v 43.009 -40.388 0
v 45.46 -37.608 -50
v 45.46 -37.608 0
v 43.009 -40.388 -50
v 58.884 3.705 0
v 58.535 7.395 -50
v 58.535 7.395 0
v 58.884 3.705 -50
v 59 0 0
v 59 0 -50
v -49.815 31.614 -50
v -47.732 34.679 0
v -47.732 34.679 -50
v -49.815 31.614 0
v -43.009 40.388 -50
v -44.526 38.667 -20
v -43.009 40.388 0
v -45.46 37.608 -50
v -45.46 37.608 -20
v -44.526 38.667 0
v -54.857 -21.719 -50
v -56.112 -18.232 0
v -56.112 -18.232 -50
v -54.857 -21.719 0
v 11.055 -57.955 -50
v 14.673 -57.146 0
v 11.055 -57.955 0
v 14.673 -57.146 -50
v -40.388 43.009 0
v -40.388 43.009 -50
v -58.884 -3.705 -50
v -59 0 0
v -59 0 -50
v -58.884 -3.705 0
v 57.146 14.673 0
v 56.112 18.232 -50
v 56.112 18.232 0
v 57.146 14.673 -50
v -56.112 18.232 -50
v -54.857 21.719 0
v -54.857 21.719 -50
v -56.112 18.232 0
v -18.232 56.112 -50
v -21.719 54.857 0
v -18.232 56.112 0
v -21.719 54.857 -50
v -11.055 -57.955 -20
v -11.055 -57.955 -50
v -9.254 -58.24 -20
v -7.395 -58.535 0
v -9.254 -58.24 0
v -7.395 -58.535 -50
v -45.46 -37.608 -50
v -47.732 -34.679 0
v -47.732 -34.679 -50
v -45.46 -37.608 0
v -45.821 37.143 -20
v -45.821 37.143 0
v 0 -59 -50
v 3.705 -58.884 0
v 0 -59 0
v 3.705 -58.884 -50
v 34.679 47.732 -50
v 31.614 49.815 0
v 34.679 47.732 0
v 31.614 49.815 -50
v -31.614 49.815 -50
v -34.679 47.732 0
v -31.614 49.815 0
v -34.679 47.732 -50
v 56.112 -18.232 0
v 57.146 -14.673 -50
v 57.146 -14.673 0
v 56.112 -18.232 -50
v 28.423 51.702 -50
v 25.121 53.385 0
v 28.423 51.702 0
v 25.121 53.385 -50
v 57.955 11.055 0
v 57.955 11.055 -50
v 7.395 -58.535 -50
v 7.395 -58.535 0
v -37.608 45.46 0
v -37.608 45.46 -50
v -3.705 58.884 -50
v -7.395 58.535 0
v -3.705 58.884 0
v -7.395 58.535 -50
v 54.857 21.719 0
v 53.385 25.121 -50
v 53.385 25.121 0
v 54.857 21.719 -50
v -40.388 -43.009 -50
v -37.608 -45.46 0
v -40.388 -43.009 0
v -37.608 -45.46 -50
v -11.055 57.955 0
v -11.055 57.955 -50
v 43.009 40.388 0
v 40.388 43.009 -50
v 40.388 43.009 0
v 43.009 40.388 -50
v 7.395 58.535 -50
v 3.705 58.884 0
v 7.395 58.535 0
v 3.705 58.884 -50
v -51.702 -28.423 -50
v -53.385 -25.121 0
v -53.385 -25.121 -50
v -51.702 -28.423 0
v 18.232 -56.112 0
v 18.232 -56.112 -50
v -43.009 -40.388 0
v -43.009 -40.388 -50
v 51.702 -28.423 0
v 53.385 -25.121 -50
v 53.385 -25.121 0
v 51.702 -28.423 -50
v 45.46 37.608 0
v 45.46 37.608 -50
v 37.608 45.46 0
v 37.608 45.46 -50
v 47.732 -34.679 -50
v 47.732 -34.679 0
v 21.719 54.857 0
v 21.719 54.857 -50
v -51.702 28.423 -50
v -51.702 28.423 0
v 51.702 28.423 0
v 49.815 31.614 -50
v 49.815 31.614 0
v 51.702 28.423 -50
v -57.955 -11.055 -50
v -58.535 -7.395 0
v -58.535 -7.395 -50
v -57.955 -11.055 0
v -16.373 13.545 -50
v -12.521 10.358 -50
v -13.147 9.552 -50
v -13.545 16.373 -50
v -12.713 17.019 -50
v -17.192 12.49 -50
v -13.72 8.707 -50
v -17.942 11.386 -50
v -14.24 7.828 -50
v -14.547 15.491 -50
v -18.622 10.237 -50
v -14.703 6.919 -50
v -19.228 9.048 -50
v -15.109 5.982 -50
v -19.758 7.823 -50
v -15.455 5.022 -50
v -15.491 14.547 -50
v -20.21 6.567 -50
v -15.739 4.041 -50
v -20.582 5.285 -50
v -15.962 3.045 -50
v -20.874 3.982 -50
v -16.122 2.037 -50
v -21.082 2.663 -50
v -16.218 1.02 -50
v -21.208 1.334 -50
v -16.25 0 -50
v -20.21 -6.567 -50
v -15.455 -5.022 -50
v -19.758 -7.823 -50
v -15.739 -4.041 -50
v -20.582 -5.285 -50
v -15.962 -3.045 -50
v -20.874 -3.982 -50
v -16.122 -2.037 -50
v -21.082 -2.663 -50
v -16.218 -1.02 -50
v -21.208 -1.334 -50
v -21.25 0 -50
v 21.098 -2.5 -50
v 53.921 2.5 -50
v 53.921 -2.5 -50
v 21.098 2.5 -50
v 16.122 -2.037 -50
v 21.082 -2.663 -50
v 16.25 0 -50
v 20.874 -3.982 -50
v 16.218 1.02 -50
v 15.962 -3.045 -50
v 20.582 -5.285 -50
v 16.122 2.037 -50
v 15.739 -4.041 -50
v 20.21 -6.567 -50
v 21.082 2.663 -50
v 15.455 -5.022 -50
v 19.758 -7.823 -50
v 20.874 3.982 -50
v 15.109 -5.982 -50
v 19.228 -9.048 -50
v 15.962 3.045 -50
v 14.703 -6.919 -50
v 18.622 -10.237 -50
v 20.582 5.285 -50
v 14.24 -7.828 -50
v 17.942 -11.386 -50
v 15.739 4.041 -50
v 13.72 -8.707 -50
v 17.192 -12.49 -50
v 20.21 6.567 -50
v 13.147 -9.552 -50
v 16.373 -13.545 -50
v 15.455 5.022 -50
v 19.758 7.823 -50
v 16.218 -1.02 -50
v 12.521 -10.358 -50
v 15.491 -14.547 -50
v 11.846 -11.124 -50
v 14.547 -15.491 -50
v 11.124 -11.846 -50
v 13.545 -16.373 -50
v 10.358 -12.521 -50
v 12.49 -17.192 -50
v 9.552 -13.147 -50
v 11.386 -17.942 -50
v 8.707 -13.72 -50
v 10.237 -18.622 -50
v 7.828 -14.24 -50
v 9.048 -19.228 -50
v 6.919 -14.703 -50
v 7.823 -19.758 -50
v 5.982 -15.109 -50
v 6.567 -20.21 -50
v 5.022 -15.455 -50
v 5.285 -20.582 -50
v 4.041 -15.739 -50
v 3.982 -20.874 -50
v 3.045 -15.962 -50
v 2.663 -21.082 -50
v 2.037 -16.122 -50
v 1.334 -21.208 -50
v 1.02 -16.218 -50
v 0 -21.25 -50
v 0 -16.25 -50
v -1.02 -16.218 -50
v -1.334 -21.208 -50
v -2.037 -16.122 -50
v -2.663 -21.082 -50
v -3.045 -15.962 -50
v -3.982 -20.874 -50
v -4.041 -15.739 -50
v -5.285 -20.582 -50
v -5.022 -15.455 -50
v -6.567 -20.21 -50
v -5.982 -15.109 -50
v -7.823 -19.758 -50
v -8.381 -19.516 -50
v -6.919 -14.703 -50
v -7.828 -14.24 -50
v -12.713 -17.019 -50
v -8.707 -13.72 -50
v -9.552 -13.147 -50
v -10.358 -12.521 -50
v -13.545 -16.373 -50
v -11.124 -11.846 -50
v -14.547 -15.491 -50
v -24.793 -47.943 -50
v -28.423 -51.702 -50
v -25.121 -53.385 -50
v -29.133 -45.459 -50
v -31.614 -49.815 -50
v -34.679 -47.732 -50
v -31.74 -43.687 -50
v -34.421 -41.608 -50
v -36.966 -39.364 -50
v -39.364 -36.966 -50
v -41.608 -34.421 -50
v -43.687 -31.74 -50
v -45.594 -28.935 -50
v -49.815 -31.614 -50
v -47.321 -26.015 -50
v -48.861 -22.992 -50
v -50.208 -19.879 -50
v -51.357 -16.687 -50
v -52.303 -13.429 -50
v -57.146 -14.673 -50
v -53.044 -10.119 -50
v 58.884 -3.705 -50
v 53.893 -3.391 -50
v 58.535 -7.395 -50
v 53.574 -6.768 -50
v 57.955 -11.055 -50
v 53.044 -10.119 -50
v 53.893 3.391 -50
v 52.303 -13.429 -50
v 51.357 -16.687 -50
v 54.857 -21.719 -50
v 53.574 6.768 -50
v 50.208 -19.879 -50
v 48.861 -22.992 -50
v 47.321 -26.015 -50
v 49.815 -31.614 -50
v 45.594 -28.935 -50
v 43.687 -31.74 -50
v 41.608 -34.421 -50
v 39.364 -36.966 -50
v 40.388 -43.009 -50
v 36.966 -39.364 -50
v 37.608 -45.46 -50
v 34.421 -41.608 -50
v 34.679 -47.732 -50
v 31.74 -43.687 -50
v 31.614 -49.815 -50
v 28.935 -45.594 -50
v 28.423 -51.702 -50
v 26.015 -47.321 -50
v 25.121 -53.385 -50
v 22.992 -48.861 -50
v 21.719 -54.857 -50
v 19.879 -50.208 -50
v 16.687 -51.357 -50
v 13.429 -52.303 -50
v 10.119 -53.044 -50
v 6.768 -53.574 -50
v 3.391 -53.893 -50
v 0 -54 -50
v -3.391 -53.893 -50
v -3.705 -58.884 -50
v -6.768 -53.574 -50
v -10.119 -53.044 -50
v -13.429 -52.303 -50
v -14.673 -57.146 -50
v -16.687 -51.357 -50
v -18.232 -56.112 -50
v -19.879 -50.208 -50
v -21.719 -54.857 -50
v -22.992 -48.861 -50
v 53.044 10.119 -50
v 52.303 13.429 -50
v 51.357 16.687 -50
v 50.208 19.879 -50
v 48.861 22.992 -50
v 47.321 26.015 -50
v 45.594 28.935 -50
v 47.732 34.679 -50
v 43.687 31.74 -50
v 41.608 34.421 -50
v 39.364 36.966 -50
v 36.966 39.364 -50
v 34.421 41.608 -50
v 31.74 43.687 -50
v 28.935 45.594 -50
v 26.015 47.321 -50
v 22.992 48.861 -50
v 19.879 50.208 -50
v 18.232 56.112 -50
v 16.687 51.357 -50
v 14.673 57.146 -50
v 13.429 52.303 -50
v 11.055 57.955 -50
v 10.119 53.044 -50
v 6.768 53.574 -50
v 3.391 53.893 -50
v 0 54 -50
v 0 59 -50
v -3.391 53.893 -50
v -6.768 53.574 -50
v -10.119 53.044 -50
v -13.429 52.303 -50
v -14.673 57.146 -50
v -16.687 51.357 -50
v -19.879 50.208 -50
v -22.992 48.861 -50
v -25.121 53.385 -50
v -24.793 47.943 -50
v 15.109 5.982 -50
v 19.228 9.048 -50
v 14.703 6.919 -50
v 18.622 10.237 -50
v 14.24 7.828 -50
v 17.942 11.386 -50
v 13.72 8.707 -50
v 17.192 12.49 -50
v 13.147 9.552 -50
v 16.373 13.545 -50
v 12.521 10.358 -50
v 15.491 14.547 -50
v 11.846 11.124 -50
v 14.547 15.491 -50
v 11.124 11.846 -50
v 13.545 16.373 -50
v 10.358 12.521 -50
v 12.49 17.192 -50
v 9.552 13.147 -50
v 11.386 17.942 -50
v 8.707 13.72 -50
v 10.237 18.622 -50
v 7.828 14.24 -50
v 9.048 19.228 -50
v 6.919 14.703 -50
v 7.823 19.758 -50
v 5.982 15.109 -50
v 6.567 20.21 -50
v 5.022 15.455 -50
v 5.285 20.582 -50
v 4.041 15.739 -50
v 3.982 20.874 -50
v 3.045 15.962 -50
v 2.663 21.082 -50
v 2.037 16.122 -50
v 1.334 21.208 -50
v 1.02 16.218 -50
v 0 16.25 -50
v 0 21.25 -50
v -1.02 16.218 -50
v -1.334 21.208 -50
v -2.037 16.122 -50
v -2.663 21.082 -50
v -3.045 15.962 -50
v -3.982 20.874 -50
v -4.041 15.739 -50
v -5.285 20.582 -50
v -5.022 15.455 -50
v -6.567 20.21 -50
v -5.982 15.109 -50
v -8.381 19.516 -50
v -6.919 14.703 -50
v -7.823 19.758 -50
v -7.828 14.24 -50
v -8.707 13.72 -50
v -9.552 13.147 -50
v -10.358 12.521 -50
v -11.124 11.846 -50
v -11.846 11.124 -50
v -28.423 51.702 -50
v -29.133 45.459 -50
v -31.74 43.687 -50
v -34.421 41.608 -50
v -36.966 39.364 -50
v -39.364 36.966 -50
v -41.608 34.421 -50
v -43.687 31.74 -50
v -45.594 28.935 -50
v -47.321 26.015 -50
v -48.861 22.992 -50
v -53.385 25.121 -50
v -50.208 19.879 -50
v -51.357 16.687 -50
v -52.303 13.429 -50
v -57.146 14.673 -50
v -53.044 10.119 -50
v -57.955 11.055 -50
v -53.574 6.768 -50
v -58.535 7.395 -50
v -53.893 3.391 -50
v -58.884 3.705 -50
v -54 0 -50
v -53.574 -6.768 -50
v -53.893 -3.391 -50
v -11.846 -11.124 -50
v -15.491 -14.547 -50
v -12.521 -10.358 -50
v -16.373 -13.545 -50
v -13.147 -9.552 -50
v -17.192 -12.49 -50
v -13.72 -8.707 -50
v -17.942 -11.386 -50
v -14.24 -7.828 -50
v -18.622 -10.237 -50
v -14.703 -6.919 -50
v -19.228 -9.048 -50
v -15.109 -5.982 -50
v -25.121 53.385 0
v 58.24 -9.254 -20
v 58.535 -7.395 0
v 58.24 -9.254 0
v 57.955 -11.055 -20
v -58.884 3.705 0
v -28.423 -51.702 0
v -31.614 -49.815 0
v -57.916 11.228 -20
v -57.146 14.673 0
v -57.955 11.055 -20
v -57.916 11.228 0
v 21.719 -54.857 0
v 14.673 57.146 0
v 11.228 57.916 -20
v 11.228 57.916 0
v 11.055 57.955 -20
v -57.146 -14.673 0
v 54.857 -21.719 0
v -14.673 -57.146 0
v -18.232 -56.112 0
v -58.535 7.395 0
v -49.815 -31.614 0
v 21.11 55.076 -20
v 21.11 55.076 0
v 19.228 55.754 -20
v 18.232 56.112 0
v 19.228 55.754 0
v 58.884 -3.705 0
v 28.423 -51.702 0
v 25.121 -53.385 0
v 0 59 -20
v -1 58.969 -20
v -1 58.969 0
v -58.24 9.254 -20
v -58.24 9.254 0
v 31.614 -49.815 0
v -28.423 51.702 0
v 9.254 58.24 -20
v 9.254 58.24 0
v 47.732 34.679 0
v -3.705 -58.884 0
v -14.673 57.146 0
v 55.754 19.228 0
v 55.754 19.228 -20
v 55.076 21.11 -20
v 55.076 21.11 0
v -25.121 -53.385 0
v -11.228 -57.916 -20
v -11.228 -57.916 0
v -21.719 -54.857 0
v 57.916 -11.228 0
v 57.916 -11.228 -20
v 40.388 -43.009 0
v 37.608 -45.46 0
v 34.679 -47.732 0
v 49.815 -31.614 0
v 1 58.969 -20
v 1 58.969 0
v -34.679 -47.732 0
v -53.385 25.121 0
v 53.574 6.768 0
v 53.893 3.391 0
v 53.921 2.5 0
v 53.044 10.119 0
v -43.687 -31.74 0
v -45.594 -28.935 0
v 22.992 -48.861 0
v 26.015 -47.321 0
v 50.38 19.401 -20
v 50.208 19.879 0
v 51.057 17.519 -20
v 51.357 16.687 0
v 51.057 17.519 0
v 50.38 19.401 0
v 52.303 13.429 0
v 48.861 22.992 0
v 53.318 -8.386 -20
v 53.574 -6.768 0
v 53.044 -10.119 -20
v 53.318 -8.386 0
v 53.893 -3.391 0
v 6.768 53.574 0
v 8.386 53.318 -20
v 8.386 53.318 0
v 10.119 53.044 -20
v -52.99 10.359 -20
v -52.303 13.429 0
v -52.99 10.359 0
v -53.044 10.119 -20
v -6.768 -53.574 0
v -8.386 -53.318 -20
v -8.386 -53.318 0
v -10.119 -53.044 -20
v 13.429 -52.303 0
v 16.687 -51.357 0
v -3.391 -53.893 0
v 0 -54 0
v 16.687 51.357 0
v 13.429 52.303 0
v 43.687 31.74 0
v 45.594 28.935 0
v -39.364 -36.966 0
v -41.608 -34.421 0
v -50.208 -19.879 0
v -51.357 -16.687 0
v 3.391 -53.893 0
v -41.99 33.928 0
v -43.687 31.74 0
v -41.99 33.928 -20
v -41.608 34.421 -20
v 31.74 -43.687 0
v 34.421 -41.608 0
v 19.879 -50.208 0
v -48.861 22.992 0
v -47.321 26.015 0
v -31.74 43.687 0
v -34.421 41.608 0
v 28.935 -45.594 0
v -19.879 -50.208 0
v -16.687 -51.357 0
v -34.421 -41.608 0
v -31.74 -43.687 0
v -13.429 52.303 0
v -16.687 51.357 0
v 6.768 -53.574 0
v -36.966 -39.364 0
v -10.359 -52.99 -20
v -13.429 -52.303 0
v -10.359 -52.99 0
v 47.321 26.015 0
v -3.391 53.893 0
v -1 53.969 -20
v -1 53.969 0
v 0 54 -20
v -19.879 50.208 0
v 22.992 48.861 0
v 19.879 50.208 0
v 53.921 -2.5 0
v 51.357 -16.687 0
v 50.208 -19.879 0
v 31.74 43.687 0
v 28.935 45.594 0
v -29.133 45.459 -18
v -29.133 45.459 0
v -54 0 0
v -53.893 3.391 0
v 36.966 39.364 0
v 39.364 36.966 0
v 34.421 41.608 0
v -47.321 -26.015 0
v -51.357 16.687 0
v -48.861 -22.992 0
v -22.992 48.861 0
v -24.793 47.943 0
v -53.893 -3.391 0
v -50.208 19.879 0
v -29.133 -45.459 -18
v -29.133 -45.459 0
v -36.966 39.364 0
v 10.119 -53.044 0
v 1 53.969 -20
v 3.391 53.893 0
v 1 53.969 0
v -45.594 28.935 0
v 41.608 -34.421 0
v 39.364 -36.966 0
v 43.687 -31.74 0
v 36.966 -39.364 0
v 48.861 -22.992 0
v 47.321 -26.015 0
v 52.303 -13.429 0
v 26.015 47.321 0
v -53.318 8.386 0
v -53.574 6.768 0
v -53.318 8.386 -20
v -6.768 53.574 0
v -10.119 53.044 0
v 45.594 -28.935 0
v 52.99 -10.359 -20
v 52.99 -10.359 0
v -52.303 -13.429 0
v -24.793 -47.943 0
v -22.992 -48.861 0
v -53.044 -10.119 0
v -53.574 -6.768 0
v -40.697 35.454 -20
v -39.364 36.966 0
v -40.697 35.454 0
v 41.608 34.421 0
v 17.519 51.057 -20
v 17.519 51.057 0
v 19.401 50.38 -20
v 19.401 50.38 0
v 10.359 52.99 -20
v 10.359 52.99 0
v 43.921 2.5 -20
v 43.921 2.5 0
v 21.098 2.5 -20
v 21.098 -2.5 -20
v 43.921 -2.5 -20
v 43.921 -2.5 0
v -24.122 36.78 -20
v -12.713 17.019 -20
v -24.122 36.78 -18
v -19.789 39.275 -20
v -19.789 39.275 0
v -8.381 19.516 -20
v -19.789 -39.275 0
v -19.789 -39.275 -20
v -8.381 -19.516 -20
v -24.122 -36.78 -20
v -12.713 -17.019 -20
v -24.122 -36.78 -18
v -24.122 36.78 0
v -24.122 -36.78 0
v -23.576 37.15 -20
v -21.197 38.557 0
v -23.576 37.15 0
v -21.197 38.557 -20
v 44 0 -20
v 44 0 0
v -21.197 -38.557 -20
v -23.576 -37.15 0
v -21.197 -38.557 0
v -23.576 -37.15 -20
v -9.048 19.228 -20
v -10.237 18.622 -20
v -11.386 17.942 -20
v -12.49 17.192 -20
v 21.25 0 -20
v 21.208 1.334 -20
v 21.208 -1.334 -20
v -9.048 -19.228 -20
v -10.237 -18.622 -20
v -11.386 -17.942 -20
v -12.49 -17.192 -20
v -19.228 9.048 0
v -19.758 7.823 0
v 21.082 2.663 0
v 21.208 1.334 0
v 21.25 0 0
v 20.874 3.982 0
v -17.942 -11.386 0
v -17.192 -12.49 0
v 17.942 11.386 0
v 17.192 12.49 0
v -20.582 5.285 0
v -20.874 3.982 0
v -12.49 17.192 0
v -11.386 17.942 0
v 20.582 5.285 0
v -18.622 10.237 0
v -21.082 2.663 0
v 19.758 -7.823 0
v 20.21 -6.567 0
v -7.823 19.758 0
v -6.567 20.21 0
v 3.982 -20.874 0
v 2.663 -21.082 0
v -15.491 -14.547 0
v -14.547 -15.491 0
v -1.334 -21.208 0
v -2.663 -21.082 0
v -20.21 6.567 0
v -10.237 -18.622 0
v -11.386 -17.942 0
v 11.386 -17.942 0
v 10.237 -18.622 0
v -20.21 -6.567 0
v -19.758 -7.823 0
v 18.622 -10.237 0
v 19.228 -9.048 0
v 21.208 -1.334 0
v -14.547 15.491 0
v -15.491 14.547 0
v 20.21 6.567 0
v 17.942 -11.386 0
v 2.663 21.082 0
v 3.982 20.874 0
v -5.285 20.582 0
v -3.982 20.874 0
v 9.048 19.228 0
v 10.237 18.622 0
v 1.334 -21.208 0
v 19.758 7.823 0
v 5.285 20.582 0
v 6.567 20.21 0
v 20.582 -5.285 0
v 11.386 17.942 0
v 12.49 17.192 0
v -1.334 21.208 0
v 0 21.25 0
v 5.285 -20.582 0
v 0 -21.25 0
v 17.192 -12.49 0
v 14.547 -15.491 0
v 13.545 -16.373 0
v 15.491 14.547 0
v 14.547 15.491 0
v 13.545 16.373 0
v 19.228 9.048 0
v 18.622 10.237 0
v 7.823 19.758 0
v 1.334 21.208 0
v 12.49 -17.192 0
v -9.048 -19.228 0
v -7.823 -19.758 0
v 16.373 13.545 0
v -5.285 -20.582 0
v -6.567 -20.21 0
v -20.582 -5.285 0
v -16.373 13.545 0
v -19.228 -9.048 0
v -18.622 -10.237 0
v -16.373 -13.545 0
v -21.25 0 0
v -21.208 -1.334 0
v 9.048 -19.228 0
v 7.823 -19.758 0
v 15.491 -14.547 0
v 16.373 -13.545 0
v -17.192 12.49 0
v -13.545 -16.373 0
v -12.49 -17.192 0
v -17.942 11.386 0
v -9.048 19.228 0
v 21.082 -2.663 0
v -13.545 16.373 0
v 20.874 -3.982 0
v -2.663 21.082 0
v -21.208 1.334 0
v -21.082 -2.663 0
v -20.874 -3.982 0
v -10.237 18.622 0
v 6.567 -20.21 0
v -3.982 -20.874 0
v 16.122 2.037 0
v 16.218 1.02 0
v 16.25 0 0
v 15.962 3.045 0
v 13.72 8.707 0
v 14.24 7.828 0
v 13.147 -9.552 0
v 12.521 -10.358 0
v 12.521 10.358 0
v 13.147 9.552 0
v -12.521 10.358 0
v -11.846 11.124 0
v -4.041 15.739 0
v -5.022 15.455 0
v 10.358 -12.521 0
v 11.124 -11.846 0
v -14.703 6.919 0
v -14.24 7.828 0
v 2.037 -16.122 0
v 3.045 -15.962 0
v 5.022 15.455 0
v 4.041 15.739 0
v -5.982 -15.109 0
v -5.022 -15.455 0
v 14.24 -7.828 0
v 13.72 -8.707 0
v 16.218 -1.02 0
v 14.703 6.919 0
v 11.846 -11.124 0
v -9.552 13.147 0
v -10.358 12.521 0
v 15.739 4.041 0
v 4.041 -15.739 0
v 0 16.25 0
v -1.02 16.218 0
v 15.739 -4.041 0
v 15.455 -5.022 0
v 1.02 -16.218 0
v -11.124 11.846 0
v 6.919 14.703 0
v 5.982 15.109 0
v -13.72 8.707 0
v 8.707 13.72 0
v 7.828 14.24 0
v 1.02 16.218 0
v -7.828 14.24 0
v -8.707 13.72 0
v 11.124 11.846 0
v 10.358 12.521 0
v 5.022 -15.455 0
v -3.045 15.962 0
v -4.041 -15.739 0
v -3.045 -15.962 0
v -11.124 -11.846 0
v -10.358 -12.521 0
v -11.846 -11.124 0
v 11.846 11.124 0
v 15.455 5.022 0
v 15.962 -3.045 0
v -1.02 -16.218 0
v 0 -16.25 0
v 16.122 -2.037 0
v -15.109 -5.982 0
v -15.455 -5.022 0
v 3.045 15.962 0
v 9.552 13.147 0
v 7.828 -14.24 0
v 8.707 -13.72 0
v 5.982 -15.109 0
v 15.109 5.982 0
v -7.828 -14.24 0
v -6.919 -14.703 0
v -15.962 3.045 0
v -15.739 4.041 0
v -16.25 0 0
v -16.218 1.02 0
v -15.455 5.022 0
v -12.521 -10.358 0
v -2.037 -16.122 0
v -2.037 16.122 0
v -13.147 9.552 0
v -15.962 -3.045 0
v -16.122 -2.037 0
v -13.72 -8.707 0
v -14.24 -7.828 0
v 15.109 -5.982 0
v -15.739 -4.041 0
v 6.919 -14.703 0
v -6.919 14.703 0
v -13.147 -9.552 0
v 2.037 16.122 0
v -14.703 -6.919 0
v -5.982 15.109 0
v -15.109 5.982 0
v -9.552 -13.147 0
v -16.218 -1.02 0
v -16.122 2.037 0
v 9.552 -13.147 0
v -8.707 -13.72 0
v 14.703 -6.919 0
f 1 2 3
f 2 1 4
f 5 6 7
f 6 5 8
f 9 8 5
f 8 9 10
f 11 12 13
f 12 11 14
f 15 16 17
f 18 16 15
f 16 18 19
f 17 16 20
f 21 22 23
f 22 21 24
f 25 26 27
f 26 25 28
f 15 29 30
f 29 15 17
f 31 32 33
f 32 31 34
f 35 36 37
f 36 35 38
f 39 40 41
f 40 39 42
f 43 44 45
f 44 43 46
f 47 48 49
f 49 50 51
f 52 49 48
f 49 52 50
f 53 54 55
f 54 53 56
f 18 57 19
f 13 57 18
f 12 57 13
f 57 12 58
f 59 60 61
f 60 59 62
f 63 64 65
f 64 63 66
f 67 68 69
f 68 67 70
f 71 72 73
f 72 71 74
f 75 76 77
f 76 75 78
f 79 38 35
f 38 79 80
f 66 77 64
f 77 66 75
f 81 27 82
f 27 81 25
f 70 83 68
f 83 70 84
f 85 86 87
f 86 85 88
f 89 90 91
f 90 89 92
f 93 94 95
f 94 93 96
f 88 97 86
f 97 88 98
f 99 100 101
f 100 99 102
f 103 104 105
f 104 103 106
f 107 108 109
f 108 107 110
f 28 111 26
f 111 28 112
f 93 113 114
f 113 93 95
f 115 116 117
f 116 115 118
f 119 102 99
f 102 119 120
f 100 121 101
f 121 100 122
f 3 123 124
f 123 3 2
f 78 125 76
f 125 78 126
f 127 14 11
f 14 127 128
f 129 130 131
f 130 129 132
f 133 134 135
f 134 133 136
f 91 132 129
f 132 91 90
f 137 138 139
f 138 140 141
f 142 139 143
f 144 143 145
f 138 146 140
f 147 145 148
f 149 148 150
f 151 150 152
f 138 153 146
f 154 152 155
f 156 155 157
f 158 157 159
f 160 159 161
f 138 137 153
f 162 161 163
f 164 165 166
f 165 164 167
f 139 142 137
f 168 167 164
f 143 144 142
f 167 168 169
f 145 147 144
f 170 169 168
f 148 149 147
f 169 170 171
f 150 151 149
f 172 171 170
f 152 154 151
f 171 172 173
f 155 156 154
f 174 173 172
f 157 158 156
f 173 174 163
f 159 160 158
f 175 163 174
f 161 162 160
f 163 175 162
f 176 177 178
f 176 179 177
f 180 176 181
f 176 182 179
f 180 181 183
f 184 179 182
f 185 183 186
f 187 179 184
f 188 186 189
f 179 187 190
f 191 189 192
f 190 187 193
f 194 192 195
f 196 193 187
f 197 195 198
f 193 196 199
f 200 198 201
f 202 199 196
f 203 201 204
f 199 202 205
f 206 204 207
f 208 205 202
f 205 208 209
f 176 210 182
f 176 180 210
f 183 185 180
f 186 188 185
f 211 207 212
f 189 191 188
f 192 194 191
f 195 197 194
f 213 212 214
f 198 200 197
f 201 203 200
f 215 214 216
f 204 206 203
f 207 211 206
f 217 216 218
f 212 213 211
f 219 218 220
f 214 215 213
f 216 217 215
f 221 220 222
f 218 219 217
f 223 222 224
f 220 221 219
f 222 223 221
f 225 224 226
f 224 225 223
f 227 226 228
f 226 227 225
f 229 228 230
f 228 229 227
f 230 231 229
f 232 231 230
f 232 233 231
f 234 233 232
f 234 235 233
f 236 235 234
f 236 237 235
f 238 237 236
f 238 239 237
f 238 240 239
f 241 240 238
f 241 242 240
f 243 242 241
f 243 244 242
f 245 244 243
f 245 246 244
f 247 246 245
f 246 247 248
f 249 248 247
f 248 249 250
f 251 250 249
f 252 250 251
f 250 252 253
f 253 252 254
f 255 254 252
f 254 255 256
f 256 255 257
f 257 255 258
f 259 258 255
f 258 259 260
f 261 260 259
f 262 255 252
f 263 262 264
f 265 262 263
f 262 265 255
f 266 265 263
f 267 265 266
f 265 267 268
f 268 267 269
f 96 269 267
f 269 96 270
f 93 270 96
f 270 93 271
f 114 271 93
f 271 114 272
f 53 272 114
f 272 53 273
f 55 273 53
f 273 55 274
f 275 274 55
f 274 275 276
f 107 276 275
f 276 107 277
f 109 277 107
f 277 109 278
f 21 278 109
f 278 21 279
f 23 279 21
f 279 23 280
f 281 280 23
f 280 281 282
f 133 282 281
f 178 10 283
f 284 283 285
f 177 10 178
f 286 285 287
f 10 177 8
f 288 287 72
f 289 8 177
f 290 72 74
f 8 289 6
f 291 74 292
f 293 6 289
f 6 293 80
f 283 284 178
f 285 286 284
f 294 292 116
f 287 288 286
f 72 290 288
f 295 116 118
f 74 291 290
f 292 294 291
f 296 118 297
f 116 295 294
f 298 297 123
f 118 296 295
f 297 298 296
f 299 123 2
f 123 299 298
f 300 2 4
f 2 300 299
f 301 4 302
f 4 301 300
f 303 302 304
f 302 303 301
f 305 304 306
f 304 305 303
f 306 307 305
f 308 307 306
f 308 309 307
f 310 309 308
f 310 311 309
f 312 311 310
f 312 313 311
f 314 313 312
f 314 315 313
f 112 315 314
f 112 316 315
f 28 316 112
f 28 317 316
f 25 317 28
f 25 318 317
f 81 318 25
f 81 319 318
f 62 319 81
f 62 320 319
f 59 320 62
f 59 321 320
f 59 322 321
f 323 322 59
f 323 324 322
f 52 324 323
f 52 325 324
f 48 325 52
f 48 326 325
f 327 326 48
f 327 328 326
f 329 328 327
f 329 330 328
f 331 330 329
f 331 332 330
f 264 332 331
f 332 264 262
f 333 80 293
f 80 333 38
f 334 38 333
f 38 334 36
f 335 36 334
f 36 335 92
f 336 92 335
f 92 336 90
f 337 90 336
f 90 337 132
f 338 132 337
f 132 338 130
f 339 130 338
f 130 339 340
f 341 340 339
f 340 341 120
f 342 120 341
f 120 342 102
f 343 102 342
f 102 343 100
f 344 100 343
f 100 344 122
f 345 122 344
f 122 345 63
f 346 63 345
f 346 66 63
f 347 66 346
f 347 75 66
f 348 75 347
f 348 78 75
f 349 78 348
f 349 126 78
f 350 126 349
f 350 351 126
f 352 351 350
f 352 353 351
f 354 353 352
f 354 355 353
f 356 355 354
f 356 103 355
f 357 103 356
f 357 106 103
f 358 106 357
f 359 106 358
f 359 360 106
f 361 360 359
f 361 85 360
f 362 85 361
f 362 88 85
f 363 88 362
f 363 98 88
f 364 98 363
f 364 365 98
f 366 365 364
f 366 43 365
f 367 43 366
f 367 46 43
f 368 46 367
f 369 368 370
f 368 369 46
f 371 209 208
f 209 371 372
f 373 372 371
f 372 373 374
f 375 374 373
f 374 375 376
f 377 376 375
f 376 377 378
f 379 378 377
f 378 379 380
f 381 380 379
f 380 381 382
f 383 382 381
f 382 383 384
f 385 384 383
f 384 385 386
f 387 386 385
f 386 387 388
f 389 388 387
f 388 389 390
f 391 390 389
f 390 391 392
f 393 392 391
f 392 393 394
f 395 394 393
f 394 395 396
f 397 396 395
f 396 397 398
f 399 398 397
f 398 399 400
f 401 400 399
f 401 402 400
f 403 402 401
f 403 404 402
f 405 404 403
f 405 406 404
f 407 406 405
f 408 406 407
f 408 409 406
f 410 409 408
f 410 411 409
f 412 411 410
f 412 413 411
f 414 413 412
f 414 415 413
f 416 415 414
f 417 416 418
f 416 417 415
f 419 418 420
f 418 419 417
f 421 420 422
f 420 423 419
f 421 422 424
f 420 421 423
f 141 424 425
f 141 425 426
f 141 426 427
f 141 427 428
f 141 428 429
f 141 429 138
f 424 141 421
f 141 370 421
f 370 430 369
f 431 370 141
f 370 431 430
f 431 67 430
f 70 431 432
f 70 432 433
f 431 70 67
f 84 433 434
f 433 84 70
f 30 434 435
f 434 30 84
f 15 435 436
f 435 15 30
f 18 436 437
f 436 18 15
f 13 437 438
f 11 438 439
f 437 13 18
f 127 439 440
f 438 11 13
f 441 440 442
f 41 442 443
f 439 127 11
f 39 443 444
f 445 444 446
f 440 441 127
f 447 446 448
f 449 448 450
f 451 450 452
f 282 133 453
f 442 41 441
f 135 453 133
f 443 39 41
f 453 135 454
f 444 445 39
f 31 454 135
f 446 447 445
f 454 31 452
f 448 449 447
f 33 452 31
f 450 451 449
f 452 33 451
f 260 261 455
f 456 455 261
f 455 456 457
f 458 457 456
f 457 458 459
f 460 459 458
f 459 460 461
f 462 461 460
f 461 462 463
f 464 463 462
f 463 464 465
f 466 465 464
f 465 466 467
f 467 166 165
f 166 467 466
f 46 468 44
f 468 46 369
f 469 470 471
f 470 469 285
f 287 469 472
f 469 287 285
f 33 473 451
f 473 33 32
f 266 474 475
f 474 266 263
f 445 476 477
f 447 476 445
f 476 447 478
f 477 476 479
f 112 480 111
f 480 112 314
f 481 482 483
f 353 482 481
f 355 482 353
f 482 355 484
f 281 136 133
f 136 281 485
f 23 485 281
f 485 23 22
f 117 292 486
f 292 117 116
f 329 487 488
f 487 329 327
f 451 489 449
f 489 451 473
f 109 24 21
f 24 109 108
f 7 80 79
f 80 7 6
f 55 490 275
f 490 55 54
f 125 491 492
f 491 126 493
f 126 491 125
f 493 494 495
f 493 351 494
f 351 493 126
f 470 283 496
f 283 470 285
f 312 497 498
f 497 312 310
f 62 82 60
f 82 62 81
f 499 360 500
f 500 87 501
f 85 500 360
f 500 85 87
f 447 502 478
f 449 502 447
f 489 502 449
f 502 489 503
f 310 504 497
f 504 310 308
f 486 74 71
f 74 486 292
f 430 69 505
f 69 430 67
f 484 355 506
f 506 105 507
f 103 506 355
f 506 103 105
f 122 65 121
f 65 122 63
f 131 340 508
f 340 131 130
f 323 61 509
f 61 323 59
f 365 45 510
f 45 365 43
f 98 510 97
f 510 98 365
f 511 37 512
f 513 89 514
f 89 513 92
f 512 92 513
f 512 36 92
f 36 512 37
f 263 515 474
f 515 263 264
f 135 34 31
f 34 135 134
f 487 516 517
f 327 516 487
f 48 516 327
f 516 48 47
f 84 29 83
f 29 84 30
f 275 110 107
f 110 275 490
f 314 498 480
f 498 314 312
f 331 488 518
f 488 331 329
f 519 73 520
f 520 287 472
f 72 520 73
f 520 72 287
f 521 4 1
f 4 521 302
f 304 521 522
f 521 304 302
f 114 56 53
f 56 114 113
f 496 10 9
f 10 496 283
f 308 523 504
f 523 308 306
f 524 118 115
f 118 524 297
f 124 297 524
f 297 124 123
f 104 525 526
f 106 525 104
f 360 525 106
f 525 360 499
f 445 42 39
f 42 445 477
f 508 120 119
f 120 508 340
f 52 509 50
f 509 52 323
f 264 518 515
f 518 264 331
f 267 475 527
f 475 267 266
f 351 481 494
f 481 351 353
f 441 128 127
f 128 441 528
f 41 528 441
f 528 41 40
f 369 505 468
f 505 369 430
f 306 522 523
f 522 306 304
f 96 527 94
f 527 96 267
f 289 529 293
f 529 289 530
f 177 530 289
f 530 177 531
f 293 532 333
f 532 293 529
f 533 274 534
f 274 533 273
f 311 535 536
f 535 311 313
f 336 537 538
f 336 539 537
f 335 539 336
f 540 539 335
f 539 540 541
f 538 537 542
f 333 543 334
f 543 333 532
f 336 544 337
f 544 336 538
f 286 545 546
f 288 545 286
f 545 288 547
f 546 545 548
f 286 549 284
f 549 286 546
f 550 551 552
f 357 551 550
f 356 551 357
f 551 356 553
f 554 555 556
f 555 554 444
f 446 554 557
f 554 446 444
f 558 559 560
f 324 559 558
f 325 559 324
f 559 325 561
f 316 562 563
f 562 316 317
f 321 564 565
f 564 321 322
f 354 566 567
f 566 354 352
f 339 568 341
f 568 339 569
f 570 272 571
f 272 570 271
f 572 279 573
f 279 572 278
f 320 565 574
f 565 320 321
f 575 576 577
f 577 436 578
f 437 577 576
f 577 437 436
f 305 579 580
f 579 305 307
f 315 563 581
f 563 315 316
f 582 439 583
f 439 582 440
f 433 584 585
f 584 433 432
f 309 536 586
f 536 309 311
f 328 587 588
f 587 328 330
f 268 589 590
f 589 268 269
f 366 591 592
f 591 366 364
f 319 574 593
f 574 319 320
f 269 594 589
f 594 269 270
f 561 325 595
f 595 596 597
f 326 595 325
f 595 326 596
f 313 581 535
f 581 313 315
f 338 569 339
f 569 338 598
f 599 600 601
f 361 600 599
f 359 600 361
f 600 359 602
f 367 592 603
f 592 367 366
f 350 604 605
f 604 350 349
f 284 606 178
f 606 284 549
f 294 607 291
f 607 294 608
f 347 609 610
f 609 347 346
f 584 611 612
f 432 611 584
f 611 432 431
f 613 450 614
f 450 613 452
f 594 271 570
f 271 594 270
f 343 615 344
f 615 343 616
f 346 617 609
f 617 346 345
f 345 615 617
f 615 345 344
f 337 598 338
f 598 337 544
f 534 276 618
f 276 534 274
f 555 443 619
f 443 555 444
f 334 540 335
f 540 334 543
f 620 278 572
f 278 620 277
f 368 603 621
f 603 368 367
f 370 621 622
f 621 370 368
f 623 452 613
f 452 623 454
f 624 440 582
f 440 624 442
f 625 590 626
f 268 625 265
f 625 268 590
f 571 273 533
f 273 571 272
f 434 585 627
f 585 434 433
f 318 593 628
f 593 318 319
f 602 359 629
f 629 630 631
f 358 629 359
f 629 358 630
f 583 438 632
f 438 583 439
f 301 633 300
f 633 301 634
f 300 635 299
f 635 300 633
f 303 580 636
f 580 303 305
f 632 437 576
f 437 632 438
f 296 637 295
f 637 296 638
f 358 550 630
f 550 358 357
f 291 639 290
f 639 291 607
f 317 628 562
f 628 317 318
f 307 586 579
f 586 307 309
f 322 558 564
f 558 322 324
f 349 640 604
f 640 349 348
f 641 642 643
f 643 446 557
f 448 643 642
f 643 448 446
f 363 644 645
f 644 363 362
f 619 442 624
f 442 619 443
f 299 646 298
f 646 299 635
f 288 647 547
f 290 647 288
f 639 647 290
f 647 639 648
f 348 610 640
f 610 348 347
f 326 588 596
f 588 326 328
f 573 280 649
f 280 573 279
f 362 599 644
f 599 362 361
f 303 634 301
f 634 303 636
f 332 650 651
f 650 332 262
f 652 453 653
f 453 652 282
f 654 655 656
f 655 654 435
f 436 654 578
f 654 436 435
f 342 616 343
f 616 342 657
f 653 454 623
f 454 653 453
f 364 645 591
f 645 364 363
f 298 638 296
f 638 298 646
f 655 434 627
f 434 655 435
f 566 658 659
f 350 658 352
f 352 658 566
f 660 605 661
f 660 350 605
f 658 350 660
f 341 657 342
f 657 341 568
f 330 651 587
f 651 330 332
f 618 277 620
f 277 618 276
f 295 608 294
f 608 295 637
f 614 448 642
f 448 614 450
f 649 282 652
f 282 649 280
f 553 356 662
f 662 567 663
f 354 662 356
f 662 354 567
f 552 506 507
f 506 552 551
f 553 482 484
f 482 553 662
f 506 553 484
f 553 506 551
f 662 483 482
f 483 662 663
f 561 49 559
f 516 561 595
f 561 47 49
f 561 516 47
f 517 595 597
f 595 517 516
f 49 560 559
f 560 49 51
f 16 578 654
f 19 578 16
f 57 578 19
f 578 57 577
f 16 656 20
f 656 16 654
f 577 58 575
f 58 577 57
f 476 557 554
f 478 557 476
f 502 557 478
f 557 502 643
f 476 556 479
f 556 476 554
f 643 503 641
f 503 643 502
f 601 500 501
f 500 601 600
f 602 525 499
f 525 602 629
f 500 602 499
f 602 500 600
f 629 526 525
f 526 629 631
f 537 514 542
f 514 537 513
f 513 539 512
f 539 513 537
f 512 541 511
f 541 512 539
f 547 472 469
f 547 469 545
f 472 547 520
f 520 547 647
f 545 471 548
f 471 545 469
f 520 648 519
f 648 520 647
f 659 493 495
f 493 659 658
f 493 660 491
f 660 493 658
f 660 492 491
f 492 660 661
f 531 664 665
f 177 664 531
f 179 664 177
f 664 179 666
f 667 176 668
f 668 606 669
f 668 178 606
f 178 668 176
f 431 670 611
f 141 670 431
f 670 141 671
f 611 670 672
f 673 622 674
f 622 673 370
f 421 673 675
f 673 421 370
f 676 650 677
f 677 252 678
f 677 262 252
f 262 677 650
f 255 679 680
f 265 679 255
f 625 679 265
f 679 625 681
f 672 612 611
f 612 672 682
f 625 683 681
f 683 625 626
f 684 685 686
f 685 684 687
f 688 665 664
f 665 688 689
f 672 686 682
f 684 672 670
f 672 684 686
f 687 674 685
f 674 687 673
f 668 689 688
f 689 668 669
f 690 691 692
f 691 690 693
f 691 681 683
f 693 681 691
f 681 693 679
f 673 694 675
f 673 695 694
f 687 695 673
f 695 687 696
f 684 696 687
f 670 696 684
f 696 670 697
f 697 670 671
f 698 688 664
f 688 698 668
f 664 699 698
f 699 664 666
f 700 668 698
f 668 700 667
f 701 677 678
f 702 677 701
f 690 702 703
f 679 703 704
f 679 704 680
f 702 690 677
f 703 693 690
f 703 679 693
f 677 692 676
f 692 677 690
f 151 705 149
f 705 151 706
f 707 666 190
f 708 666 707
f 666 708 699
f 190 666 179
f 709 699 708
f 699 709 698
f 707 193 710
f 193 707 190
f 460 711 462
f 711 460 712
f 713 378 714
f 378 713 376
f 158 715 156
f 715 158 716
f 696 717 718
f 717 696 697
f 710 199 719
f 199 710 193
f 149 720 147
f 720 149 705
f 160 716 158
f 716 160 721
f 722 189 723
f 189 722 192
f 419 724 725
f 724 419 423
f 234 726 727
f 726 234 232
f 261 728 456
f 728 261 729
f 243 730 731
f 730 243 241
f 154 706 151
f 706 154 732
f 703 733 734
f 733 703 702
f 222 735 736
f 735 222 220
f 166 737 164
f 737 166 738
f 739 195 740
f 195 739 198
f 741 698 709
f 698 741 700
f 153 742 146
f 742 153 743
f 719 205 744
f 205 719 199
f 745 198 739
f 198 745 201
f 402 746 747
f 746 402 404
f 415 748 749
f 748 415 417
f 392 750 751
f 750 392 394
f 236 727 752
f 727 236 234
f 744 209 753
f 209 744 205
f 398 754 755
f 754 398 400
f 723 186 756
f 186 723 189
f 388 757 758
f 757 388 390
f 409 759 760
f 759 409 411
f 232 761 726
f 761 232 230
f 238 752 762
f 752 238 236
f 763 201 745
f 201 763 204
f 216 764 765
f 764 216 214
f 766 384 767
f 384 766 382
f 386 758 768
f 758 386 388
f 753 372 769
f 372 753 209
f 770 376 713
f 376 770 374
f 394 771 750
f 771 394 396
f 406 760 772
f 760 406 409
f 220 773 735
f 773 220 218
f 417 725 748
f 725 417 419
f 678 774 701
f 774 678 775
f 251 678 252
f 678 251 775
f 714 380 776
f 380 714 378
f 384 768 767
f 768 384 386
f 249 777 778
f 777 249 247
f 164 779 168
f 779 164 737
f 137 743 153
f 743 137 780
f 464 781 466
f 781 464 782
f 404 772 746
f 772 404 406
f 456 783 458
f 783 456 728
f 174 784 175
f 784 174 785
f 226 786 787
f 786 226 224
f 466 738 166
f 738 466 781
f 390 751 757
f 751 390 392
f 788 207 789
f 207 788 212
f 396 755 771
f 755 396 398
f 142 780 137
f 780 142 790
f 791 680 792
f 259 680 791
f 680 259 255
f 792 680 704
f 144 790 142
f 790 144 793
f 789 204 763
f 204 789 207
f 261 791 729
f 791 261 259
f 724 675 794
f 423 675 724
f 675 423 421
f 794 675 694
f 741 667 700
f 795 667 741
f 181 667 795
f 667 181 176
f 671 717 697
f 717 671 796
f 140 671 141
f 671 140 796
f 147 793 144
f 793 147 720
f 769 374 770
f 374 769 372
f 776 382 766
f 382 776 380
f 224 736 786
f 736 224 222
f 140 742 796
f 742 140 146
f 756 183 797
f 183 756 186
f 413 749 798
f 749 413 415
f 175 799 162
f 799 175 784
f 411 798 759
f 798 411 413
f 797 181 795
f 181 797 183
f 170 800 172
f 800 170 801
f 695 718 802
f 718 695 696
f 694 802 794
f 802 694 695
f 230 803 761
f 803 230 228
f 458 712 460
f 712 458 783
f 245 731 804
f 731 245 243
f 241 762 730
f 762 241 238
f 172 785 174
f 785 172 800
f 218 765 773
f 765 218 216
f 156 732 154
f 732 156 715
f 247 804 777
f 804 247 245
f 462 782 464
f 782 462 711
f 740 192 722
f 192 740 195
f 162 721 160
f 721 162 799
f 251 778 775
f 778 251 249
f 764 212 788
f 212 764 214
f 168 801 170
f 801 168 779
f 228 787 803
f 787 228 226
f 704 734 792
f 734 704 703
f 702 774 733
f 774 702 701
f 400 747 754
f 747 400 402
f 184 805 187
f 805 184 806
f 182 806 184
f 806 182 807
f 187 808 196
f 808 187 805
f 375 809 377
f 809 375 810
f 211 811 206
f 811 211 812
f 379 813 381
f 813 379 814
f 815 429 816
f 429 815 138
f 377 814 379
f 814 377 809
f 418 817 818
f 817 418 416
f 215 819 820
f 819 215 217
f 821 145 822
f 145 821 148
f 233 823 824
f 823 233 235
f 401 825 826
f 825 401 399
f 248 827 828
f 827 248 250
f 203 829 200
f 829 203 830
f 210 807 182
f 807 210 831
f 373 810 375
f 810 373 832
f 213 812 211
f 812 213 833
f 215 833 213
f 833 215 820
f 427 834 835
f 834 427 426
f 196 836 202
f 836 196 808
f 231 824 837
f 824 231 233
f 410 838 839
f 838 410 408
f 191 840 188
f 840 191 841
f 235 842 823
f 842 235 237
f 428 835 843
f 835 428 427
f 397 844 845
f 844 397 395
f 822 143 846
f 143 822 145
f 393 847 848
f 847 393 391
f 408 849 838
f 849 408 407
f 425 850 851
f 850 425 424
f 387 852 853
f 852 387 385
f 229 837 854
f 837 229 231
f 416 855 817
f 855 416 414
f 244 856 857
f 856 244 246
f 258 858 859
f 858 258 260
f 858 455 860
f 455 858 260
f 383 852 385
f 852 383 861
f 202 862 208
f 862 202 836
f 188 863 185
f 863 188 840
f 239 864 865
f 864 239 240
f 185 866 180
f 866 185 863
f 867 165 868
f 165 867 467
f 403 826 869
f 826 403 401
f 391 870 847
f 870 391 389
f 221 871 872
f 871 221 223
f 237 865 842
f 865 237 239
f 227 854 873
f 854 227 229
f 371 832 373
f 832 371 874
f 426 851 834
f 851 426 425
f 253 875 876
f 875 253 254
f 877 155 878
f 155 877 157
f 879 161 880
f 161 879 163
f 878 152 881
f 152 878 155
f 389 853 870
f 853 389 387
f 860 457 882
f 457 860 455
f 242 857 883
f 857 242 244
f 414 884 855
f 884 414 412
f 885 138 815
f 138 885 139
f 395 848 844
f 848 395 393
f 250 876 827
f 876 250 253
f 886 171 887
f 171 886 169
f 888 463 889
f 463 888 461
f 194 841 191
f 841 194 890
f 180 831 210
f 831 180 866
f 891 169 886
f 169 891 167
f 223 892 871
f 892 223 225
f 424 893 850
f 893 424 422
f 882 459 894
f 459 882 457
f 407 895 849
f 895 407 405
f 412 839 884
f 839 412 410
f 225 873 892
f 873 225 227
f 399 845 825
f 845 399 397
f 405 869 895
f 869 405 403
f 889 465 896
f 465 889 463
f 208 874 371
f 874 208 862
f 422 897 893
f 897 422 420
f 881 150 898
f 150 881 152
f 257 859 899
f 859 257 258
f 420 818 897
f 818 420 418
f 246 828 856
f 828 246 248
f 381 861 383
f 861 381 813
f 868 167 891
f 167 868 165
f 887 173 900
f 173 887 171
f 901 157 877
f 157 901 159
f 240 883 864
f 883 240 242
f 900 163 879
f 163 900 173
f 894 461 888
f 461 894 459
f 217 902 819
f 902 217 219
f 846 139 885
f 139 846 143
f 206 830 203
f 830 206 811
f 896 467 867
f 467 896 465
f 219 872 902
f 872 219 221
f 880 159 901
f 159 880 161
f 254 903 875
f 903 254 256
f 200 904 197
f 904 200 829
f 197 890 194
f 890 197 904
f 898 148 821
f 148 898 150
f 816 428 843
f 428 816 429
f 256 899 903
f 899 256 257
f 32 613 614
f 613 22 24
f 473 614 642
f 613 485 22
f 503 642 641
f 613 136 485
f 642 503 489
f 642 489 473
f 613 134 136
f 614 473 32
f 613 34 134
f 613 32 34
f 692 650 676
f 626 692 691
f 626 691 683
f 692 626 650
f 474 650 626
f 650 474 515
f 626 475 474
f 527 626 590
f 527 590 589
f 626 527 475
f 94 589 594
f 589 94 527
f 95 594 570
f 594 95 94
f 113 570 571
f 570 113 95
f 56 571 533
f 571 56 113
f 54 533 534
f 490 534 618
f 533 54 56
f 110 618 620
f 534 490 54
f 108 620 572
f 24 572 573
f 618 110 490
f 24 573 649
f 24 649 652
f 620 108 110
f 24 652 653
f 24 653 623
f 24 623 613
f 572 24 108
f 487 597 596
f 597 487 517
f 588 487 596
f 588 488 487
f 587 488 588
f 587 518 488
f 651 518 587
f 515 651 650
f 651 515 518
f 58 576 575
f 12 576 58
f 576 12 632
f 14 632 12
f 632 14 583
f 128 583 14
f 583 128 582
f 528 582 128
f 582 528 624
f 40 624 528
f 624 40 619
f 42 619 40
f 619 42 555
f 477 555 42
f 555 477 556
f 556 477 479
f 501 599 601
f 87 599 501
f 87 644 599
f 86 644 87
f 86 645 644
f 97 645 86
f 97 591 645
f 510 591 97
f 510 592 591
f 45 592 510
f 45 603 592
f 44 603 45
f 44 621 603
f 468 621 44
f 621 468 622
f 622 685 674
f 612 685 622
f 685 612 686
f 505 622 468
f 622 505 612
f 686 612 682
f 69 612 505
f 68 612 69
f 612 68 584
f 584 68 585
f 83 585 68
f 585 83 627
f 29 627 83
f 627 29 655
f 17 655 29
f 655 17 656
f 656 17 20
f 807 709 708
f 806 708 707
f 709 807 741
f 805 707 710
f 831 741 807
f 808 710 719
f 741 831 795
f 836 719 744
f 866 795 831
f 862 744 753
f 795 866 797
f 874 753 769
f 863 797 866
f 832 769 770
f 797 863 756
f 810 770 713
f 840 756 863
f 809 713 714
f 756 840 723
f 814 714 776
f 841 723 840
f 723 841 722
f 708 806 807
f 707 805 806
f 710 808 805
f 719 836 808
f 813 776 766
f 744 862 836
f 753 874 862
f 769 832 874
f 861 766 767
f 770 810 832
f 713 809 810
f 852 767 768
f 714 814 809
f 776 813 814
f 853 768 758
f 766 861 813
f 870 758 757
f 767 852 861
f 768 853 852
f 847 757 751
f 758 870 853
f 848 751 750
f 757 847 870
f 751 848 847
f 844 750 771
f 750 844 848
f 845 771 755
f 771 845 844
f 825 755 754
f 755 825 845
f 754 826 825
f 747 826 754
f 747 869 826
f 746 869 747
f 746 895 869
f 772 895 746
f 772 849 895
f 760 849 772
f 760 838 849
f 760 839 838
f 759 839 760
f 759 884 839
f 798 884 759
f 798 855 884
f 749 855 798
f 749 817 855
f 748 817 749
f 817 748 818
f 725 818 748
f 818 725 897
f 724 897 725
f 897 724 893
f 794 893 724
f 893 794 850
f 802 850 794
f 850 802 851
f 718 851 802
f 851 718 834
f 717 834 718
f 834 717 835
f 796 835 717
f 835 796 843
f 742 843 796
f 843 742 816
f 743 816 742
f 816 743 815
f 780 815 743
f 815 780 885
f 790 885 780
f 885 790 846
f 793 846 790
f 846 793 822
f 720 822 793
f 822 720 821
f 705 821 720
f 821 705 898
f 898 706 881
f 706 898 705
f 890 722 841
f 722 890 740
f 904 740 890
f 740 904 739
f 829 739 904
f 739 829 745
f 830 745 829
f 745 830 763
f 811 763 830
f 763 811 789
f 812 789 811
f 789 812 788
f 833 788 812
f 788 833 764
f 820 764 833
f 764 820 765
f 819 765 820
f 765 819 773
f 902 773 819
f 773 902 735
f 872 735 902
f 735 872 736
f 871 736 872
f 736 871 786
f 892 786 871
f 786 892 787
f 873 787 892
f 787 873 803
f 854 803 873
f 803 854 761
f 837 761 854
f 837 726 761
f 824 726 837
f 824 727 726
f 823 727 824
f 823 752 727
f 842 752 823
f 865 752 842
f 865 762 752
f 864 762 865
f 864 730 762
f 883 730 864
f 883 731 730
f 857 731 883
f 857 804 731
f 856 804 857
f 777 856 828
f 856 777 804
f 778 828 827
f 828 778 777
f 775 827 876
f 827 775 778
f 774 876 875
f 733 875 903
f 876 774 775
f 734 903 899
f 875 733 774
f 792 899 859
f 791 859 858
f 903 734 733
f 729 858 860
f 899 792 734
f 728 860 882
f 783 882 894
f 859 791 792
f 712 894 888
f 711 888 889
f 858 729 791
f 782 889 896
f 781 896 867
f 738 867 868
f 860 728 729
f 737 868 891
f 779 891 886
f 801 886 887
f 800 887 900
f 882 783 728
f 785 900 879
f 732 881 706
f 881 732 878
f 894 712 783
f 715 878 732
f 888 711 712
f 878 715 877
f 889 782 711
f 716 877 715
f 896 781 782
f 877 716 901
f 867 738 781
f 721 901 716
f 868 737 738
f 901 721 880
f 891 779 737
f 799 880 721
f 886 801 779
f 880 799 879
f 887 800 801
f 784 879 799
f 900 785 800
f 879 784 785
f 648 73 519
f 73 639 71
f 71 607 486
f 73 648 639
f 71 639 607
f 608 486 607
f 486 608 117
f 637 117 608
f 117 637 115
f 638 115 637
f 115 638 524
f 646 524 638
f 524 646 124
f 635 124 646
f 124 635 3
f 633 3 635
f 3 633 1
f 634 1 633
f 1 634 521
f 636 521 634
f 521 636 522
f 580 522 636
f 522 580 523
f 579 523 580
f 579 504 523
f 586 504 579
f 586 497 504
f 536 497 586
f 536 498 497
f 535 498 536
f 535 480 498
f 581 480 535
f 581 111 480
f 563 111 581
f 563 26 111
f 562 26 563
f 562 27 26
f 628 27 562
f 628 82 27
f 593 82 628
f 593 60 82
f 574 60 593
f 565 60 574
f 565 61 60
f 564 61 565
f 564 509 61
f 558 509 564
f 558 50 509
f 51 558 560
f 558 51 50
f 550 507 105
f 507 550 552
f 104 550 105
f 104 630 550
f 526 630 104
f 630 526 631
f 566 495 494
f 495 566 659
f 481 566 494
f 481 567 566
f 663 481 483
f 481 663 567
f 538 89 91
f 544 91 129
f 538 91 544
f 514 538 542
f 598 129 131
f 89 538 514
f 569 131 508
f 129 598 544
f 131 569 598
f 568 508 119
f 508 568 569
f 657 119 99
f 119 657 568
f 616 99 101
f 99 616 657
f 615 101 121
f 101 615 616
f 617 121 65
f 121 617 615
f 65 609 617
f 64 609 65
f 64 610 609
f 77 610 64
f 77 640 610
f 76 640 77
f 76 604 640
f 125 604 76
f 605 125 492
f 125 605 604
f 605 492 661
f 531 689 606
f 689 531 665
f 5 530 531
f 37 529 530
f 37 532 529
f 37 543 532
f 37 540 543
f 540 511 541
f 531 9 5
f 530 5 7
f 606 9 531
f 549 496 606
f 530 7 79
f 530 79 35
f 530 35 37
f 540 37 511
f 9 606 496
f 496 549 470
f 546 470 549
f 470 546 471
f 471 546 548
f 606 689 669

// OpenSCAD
// OpenSCAD input script
// Created using Claude AI with lot of instructions and fixes.

// SCAD parameter "face number" to approximate ciylinders
$fn = 100;


// Parameters
main_height = 100;
outer_diameter = 118;
inner_diameter = 32.5;
wall_thickness = 5;
num_ribs = 3;
cut_diameter = outer_diameter - 30;
rib_height = 30;

// Spring parameters
spring_thickness = 2;
spring_height = 30;
//spring_width = 30;
spring_gap = 2;
spring_extension = 4;
n_slices = 10;

// strip holes parameters
strip_width = 2;
strip_height = main_height - 2 * rib_height;


strip_angles_ = [0, 180, 300, 270, 350];
angle_zero = 20;
strip_angles = concat(
    [for (a = strip_angles_) angle_zero - a],
    [for (a = strip_angles_) angle_zero + a]);

// Derived parameters
outer_radius = outer_diameter / 2;
inner_radius = inner_diameter / 2;
middle_radius = (outer_radius + inner_radius) / 2;
cut_radius = cut_diameter / 2;

// Calculated spring position
//function chord_height(r, w) = r - sqrt(r*r - (w/2)*(w/2));
//spring_chord_height = chord_height(outer_radius, spring_width);
//spring_offset = outer_radius - spring_thickness/2 - spring_chord_height;


module cylinder_shell(height, radius, thickness) {
    difference() {
        cylinder(h = height, r = radius, center = true);
        cylinder(h = height + 1, r = radius - thickness, center = true);
    }
}

// Outer cylinder shell
module outer_shell() {
    difference() {
        cylinder_shell(main_height, outer_radius, wall_thickness);
        for(angle = strip_angles) {
            rot_angle = (180 / num_ribs + angle) % 360;
            rotate([0, 0, rot_angle])
            translate([outer_radius, 0, 0])
            cube([3*wall_thickness, strip_width, strip_height], center = true);
        }    
    }
}

// Inner cylinder shell
module inner_shell() {
    translate([0, 0, (spring_height +  spring_gap)/2])
    cylinder_shell(main_height + spring_height +  spring_gap, inner_radius + wall_thickness, wall_thickness);
}

// Single rib
module rib() {
    translate([inner_radius, -wall_thickness/2, -main_height/2])
    cube([outer_radius - inner_radius - wall_thickness/2, 
        wall_thickness, 
        main_height]);
}

// Cut cylinder
module cut_cylinder() {
    cylinder(h = main_height - 2*rib_height, r = cut_radius, center = true);
}

// Single spring - box approximation
module spring_approx() {
    cube([spring_thickness, spring_width, spring_height], center = true);
}

/*
module spring_vertical_cut() {
    L = spring_height;
    D = spring_extension;
    radius = (L*L + 4 * D*D) / (8 * D); 
    angle = 2 * acos( (radius - D) / radius );
    
    translate([-(radius - D), 0])
    intersection() {
        difference() {
            circle(radius);
            circle(radius - spring_thickness);
        }
        translate([radius/2, 0])
        square([radius, spring_height], center=true);
    }
}

// Simple planar spring (vertically bent)
module spring() {
    spring_angle = spring_width / outer_radius / 2 / PI * 180;
    rotate_extrude(angle=spring_angle, $fn=100) {
        translate([outer_radius, 0])
        //rotate([90, 0, 0])
        spring_vertical_cut();
    }
}

// Simple planar spring (vertically bent)
module spring_v() {
    points = [
        [-spring_thickness/2, -spring_height/2],
        [spring_thickness/2, -spring_height/2],
        [spring_thickness/2 + spring_extension, 0],  // Bend point
        [spring_thickness/2, spring_height/2],
        [-spring_thickness/2, spring_height/2],
        [-spring_thickness/2 + spring_extension, 0]  // Bend point on the other side
    ];
    
    spring_angle = spring_width / outer_radius / 2 / PI * 180;
    rotate_extrude(angle=spring_angle) {
        translate([outer_radius - spring_thickness/2, 0])
        //rotate([90, 0, 0])
        polygon(points);
    }
}
*/


/*
// Calculate the radius of the spring cylinders
spring_radius = (outer_radius + spring_extension) / (1 + 2 / sqrt(3));

// Function to create a single horizontal cut with varying r_x
module barrel_spring_cut(r_x) {
    union() {
        // Semi-circle result
        difference() {
            circle(spring_radius, $fn=20);
            translate([spring_radius / 2, 0])
            square([spring_radius, 2 * spring_radius], center = true);
        }

        // Ellipse for X>0
        scale([r_x, 1])
        circle(spring_radius, $fn=20);
    }
}

// Function to calculate r_x based on z
function r_x(z) = 1 - (spring_radius - spring_extension) / spring_radius * pow(z / spring_height, 2);

// Module to create the deformed barrel spring using hull operation
module spring_barrel() {
    hull() {
        for (z = [-spring_height/2 : spring_height/n_slices : spring_height/2]) {
            translate([0, 0, z])
            linear_extrude(height = spring_thickness)
            barrel_spring_cut(r_x(z));
        }
    }
}


module horizontal_spring() {
    inner_scale = (spring_radius - spring_thickness) / spring_radius;
    difference(){
        spring_barrel();
        scale([inner_scale, inner_scale, 1])
        spring_barrel();
    }
} */

function r_for_chord(chord, extension) = (chord*chord/4 + extension*extension) / 2 / extension;

module horizontal_spring() {
    // three touching springs, without extension
    spring_radius = outer_radius / (1 + 2 / sqrt(3));
    contact_bump_r = r_for_chord(spring_height, spring_extension)*2/3;

    spring_z_shift = main_height/2 + spring_height/2 + spring_gap;
    translate([2/sqrt(3) * spring_radius, 0, 
                spring_z_shift])
    difference() {
        union() {
            cylinder(h=spring_height, r=spring_radius, center=true);
            translate([spring_radius - contact_bump_r + spring_extension, 0, 0])
            sphere(r=contact_bump_r);
        }
        cylinder(h=4*spring_height, r=spring_radius - spring_thickness, center=true);
    }
    
}

// Main assembly
module main_assembly() {
    union() {
        difference() {
            union() {
                outer_shell();
                for (i = [0:num_ribs-1]) {
                    angle = i * 360 / num_ribs;
                    rotate([0, 0, angle])
                    rib();
                }
                // Add springs
                for (i = [0:num_ribs-1]) {
                    angle = i * 360 / num_ribs;  // Offset by half the angle between ribs
                    rotate([0, 0, angle  + 180 / num_ribs])
                    horizontal_spring();
                    rotate([0, 0, angle])
                    translate([0, 0, spring_height+spring_gap])
                    difference(){
                        rib();
                        translate([outer_radius*0.4, -outer_radius/2, 0])
                        cube([outer_radius, outer_radius, outer_radius]);
                    }
                }
            }
            union() {
                cut_cylinder();
                cylinder(h=3*main_height, r=inner_radius + wall_thickness/2, center=true);
            }
        }
        inner_shell();
    }   
}

 
// Render the assembly
difference() {
    main_assembly();  
    translate([0, 0, main_height/2])
    cube([3*outer_radius, 3*outer_radius, main_height], center=true);
}
